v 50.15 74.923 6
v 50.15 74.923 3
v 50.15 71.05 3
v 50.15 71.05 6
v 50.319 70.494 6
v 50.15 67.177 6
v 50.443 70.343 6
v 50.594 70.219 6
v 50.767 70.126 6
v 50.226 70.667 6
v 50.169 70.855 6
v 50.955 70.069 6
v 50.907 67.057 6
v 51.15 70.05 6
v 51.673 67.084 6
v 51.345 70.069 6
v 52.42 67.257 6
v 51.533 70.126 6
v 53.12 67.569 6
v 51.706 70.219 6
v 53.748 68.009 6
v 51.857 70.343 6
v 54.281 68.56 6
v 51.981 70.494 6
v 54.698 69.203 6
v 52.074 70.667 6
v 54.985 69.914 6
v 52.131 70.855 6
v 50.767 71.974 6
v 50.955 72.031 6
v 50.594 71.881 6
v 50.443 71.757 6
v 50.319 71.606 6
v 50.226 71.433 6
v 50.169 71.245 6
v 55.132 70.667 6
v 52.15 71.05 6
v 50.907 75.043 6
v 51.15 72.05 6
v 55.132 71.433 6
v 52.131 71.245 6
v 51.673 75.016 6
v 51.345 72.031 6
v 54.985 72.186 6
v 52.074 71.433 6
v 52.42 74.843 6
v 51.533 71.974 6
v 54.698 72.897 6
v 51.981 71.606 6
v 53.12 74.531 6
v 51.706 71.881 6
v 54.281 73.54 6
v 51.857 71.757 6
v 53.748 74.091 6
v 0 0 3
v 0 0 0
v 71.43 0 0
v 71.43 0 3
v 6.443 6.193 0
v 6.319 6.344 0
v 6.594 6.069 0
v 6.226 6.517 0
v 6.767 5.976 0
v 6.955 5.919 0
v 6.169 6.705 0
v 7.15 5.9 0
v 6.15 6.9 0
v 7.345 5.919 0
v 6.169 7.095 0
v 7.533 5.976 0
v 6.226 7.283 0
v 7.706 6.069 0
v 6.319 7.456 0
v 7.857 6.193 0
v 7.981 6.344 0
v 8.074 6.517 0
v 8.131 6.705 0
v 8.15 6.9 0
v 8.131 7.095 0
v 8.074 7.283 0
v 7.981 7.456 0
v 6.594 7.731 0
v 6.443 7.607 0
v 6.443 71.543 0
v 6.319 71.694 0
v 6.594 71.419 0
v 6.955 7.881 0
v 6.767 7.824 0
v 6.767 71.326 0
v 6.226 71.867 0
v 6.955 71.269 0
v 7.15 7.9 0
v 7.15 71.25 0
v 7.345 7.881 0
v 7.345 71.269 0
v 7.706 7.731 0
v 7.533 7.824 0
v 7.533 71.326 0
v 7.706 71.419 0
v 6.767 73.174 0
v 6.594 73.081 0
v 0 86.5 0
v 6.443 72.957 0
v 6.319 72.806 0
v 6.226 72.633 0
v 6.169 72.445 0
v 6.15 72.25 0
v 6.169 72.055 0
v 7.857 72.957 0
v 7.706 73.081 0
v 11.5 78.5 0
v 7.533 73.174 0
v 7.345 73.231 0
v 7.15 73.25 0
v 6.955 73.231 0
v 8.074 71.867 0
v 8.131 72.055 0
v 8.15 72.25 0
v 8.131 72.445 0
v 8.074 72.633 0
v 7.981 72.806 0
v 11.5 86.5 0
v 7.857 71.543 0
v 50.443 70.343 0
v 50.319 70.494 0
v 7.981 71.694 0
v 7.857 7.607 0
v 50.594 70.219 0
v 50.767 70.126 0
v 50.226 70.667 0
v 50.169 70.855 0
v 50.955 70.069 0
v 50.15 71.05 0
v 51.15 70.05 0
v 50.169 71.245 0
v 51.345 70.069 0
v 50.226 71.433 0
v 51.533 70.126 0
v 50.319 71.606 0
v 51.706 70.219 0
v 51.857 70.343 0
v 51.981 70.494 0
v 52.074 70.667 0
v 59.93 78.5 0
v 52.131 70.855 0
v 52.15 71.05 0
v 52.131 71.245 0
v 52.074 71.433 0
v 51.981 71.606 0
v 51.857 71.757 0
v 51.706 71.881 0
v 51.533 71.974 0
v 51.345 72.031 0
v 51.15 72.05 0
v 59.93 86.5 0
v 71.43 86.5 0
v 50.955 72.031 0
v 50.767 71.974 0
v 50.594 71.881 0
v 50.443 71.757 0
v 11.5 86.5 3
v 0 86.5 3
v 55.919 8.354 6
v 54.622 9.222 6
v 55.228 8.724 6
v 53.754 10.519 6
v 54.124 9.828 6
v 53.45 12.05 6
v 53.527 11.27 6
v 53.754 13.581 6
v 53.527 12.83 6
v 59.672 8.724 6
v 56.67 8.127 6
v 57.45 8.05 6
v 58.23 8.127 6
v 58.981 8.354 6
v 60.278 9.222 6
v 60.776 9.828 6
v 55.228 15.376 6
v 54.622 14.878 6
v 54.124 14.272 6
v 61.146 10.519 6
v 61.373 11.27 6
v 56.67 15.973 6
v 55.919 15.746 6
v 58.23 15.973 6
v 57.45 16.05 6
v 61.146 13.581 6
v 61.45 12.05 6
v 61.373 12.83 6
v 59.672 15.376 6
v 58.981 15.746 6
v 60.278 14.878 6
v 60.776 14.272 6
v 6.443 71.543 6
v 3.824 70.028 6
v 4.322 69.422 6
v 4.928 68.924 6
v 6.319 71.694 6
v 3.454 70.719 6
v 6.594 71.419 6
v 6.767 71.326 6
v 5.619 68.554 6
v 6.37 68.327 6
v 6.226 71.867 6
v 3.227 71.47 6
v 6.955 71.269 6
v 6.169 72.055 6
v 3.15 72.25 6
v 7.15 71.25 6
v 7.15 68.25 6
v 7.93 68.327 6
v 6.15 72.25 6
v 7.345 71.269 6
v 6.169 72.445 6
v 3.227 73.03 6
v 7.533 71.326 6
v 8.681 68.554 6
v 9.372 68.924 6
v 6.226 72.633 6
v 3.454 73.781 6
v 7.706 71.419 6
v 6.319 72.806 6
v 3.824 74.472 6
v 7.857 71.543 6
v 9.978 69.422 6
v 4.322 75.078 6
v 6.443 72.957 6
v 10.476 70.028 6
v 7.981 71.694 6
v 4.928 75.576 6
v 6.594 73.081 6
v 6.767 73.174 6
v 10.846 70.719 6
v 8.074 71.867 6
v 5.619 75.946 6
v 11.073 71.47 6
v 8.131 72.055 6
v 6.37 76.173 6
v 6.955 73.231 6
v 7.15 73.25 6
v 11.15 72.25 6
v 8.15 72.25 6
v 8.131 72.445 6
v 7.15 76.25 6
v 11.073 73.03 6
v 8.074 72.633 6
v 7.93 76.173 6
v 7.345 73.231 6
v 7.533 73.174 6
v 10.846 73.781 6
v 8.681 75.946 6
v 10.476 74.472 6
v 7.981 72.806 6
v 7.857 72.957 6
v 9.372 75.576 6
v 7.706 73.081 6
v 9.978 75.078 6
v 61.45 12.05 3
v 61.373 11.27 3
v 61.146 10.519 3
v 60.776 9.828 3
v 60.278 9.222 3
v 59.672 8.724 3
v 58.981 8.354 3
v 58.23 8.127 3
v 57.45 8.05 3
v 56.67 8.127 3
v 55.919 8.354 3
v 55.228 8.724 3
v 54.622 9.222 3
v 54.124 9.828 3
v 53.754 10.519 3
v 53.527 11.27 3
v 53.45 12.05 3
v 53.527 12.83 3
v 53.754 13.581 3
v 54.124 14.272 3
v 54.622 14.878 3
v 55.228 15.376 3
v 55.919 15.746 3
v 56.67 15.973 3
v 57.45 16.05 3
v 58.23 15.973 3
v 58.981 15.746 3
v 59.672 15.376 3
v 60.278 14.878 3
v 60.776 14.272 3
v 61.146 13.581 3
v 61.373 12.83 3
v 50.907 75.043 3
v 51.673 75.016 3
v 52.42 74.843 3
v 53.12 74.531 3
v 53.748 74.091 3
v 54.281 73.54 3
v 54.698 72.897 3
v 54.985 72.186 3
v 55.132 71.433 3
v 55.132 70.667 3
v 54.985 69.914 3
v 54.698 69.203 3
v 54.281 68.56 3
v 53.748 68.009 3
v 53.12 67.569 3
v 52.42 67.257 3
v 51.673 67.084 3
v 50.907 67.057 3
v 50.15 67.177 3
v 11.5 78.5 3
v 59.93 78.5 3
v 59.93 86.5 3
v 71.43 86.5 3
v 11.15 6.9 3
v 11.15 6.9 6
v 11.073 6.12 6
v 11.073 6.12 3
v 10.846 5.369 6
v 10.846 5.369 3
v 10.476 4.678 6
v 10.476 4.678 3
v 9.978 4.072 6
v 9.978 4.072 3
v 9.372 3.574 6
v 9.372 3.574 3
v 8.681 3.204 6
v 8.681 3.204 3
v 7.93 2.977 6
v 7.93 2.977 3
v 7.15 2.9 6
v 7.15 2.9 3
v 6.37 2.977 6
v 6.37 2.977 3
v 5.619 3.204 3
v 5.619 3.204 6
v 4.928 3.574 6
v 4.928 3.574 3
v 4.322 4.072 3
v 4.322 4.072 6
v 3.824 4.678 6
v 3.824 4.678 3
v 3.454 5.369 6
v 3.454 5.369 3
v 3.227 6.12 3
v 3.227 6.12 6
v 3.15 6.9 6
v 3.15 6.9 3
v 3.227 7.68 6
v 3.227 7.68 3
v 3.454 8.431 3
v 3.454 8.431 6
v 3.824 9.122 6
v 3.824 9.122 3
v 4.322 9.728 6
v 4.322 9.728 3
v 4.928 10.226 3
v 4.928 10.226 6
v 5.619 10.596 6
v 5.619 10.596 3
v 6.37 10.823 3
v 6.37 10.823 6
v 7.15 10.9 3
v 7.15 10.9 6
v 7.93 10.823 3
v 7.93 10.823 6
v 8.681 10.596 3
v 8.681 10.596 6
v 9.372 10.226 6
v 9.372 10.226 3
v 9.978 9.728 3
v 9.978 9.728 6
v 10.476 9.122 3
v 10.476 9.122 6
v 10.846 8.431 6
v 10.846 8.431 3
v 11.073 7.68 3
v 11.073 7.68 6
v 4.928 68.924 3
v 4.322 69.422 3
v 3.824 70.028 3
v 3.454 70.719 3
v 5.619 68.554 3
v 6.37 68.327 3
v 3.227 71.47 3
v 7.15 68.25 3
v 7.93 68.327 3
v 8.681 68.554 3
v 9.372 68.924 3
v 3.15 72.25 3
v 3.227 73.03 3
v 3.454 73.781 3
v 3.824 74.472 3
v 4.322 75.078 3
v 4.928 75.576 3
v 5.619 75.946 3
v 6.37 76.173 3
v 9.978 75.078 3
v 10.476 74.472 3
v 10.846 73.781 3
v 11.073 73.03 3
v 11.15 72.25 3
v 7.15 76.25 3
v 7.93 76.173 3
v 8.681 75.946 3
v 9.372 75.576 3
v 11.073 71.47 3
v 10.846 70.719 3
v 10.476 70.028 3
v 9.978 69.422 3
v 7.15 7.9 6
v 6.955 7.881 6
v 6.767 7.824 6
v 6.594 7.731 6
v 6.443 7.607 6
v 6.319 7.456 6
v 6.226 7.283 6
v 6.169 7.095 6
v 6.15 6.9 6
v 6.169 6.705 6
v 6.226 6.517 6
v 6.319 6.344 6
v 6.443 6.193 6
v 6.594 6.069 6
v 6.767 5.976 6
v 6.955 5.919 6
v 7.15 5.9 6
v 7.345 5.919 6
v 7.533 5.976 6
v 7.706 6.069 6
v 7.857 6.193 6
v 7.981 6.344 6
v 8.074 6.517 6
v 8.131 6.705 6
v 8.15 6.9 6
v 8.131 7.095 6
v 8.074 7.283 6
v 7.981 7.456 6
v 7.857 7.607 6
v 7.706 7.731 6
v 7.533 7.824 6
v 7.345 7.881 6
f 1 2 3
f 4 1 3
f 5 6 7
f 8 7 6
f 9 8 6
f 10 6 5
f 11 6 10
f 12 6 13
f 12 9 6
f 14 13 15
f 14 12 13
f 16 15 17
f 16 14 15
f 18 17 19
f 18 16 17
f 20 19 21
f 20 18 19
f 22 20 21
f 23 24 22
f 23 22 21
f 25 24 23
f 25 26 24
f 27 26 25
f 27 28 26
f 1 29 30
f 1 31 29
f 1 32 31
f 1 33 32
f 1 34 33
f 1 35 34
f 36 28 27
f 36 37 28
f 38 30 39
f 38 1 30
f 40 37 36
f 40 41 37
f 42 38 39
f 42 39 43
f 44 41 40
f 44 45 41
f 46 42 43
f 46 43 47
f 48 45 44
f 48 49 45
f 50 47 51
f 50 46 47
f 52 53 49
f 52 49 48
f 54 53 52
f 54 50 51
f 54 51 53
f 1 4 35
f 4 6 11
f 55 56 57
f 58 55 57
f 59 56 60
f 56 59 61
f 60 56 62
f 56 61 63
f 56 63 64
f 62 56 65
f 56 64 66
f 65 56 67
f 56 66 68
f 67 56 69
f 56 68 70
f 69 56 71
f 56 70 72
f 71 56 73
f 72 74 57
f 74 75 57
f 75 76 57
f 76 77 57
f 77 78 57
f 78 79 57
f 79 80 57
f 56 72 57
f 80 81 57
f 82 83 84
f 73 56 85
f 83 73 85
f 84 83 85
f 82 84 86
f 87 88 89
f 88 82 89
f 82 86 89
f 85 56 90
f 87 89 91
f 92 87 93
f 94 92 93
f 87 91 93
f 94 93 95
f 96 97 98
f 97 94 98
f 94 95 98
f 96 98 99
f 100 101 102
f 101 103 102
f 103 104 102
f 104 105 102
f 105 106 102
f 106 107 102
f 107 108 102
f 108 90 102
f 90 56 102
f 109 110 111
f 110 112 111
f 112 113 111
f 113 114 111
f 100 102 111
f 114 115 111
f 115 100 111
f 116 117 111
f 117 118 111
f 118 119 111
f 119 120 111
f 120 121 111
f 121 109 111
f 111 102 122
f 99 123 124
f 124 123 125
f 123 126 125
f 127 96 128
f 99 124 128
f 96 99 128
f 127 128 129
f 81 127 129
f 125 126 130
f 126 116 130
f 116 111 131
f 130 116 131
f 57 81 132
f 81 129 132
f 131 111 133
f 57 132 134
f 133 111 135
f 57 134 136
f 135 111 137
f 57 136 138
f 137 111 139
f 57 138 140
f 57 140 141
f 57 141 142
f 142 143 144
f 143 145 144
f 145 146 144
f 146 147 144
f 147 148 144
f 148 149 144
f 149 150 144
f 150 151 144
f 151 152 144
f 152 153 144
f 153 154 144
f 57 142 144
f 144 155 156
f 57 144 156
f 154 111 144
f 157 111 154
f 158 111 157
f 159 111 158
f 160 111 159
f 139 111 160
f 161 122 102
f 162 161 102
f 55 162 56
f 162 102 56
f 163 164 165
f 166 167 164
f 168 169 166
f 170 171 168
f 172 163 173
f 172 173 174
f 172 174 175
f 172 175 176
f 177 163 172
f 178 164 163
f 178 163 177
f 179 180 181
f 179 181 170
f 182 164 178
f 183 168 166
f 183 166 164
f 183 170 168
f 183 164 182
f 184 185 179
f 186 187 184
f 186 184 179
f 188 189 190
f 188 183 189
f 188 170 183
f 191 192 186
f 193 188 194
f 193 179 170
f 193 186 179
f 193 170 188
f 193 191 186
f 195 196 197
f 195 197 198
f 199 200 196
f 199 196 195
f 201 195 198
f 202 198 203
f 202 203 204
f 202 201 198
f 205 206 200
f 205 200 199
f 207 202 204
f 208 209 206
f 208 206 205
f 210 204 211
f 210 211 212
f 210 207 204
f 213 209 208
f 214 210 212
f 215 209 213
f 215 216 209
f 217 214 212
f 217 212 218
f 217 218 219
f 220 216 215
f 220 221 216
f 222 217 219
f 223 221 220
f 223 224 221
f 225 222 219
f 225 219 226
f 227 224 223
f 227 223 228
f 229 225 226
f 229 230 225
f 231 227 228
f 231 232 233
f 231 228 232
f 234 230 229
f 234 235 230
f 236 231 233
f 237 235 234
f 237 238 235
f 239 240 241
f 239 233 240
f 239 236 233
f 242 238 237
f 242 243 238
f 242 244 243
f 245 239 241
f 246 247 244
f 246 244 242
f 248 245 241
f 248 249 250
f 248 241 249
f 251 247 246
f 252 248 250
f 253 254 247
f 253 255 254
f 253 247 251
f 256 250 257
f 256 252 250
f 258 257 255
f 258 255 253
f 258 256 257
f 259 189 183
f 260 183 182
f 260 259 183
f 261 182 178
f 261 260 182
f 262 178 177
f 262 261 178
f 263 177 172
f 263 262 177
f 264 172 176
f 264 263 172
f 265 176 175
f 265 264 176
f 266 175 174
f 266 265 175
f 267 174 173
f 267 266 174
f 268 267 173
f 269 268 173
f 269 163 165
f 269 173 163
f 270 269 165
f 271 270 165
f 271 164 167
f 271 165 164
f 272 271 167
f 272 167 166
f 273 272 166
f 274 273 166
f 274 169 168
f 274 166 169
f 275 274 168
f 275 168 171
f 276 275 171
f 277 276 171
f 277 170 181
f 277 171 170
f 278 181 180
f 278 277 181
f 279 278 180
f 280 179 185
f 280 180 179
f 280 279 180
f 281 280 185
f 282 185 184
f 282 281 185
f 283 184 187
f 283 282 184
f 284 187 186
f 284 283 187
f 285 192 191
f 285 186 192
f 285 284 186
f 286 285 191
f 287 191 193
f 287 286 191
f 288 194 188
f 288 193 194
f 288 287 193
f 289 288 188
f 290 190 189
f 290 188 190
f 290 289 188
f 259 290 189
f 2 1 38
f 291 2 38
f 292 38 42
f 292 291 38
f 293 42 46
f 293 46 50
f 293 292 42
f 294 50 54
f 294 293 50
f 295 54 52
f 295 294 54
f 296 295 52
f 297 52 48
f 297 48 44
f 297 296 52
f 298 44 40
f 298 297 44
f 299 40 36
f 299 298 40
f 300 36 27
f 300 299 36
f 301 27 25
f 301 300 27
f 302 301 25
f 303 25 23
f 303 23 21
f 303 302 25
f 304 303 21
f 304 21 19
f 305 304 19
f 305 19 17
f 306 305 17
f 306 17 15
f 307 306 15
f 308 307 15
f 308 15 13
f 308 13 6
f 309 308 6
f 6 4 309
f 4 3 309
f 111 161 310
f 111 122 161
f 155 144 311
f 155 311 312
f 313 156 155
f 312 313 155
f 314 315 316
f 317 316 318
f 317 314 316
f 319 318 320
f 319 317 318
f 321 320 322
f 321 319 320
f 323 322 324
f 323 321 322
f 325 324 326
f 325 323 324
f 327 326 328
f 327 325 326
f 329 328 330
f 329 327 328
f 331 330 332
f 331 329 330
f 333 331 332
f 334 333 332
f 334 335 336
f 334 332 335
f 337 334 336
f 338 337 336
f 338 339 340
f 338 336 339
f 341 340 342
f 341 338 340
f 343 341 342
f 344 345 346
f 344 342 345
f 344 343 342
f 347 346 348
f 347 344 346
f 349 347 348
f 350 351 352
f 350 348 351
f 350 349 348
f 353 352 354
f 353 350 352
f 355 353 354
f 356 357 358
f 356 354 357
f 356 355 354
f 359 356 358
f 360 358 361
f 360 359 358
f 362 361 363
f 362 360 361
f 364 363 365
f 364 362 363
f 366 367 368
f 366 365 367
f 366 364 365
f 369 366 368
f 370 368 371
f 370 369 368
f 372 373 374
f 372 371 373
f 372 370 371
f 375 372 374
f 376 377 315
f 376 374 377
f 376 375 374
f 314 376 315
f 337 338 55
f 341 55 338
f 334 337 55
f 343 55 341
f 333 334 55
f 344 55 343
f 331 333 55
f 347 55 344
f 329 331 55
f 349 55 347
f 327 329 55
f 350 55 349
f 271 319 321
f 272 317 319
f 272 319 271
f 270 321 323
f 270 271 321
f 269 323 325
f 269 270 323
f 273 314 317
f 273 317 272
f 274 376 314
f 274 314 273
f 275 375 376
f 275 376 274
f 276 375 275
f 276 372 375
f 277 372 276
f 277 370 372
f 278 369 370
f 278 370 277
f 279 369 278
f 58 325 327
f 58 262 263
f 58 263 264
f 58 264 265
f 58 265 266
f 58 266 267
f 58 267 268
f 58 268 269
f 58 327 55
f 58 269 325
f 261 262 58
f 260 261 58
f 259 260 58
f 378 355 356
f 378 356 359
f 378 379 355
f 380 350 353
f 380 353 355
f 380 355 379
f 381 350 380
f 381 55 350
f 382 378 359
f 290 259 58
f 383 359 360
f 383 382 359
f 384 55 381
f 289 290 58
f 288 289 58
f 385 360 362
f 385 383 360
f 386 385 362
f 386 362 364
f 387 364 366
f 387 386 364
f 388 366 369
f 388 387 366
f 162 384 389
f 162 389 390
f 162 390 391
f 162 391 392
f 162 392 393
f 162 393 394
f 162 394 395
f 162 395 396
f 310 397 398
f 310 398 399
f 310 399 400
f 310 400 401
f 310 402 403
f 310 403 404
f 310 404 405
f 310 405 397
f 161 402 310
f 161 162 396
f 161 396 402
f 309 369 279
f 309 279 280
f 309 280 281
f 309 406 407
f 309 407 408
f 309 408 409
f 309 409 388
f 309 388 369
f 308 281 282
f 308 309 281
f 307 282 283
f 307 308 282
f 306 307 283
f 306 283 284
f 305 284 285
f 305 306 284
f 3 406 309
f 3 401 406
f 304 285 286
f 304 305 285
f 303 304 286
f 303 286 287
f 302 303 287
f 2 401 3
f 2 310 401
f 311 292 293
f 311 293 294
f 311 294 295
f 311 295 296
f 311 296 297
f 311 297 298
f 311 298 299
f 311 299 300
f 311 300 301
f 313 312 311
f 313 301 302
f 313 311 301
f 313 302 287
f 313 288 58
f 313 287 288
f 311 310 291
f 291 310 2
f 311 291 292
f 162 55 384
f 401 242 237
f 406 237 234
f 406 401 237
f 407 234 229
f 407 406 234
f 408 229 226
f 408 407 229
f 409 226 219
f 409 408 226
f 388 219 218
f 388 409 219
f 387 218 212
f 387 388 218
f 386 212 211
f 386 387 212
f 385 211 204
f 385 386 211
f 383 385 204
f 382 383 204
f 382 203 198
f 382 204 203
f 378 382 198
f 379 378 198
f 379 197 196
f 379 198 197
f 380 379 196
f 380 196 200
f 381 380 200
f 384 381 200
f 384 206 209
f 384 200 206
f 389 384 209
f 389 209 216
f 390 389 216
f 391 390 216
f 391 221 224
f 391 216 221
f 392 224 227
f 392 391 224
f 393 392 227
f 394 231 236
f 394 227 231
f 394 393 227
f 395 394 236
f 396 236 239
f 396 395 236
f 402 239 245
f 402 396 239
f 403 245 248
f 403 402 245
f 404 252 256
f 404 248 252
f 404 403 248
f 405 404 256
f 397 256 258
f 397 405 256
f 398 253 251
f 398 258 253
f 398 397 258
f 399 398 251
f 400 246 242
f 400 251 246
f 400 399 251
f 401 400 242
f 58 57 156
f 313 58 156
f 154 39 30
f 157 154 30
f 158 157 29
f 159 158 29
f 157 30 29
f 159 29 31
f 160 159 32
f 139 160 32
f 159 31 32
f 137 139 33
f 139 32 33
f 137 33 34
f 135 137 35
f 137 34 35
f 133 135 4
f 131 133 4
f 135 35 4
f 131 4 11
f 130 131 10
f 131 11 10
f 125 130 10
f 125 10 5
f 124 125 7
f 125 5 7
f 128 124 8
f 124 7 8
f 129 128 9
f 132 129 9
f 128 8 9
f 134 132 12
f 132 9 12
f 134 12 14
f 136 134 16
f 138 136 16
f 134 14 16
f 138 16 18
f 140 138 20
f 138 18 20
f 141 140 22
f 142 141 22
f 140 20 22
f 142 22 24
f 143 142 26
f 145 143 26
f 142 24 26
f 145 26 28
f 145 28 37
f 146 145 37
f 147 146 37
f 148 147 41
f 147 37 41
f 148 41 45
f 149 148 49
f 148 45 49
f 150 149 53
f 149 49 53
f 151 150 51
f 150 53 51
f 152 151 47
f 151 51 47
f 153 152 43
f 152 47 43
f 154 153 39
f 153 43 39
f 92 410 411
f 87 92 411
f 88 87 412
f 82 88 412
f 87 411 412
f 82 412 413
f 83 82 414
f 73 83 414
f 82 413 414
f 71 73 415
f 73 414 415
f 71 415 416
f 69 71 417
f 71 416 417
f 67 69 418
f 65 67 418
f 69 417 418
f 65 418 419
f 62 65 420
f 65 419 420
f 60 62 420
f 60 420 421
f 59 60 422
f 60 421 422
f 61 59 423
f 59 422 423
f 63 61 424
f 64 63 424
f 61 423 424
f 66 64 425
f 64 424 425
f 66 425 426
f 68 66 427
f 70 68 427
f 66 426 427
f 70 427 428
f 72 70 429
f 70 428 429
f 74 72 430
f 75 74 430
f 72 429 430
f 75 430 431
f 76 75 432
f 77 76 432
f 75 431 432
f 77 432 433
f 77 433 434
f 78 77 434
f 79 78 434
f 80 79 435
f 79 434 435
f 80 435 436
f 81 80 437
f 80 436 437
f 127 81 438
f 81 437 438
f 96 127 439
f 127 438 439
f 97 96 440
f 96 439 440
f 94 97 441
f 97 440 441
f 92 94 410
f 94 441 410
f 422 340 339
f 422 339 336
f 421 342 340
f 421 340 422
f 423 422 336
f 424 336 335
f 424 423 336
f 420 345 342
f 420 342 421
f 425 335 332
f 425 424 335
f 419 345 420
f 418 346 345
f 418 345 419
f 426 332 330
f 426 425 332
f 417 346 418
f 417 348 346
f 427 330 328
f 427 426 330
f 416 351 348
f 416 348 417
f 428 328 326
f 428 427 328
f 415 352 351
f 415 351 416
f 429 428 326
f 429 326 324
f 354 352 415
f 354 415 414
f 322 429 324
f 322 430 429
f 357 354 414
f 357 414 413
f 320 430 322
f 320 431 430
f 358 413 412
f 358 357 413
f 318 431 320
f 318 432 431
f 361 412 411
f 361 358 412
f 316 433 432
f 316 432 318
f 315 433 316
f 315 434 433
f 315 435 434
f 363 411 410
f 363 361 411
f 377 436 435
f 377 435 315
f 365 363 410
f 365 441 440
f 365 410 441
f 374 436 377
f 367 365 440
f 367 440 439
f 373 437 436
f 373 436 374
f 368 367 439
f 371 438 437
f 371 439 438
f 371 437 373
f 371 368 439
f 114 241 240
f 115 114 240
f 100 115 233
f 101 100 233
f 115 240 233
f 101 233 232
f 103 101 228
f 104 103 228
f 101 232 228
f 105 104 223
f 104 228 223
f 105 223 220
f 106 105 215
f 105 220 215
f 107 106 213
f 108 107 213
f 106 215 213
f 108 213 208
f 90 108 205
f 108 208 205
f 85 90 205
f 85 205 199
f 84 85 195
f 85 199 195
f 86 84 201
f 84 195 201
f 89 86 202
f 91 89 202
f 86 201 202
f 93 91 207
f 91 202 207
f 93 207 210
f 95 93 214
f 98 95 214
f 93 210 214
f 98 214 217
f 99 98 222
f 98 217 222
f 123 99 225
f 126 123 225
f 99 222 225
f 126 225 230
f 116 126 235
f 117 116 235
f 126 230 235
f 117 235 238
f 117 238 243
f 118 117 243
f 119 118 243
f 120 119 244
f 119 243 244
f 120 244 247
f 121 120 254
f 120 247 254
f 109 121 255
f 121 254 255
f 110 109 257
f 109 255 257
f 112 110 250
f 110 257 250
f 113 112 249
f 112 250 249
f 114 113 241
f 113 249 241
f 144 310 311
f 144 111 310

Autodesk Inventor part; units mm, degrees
ref_plane "YZ Plane" through (0, 0, 0) normal (1, 0, 0) x (0, 1, 0)
ref_plane "XZ Plane" through (0, 0, 0) normal (0, 1, 0) x (-1, 0, 0)
ref_plane "XY Plane" through (0, 0, 0) normal (0, 0, 1) x (1, 0, 0)
sketch "Sketch1" plane through (0, 0, 0) normal (0, 0, 1) x (1, 0, 0)
  line L0 (0, 0) -> (71.43, 0)
  line L1 (71.43, 0) -> (71.43, 86.5)
  line L2 (71.43, 86.5) -> (0, 86.5)
  line L3 (0, 86.5) -> (0, 0)
  line L4 (14, 86.5) -> (57.43, 86.5)
  circle A0 centre (6.25, 81.5) radius 1.5
  circle A1 centre (65.18, 81.5) radius 1.5
  line L5 (11.5, 78.5) -> (59.93, 78.5)
  line L6 (59.93, 78.5) -> (59.93, 86.5)
  line L7 (59.93, 86.5) -> (11.5, 86.5)
  line L8 (11.5, 86.5) -> (11.5, 78.5)
  line L9 (11.5, 78.5) -> (59.93, 86.5) construction
  line L10 (59.93, 78.5) -> (11.5, 86.5) construction
  line L11 (35.715, 86.5) -> (35.715, 82.5) construction
  line L12 (2.95, 2.05) -> (68.45, 2.05)
  line L13 (68.45, 2.05) -> (68.45, 76.45)
  line L14 (68.45, 76.45) -> (2.95, 76.45)
  line L15 (2.95, 76.45) -> (2.95, 2.05)
  line L16 (2.95, 2.05) -> (68.45, 76.45) construction
  line L17 (68.45, 2.05) -> (2.95, 76.45) construction
  circle A2 centre (7.15, 72.25) radius 4
  circle A3 centre (51.15, 71.05) radius 4
  circle A4 centre (7.15, 6.9) radius 4
  circle A5 centre (57.45, 12.05) radius 4
  circle A6 centre (7.15, 72.25) radius 1
  circle A7 centre (51.15, 71.05) radius 1
  circle A8 centre (7.15, 6.9) radius 1
  circle A9 centre (57.45, 12.05) radius 1
  line L18 (50.15, 74.923) -> (50.15, 67.177)
  point P0 (11.5, 86.5)
  point P1 (35.7, 39.25)
  point P2 (35.715, 0)
  point P3 (35.7, 2.05)
  point P4 (9.1397, 10.37)
  point P5 (9.1397, 3.43)
  point P6 (8.15, 10.773)
  point P7 (8.15, 3.027)
  dimension "d0" = 71.43
  dimension "d1" = 86.5
  dimension "d8" = 3
  dimension "d9" = 6.25
  dimension "d10" = 5
  dimension "d11" = 3
  dimension "d12" = 5
  dimension "d13" = 6.25
  dimension "d15" = 48.43
  dimension "d16" = 8
  dimension "d17" = 4
  dimension "d19" = 65.5
  dimension "d20" = 74.4
  dimension "d21" = 2.05
  dimension "d22" = 2.95
  dimension "d23" = 4.2
  dimension "d24" = 4.2
  dimension "d25" = 8
  dimension "d26" = 8
  dimension "d27" = 5.4
  dimension "d29" = 4.85
  dimension "d30" = 4.2
  dimension "d31" = 8
  dimension "d34" = 8
  dimension "d35" = 11
  dimension "d36" = 10
  dimension "d37" = 2
  dimension "d38" = 2
  dimension "d39" = 2
  dimension "d40" = 2
  dimension "d55" = 44
extrude "Extrusion1" add sketch "Sketch1" along normal blind 3 contours L3 L2 L8 L5 L6 L1 L0 | A0 | A1 | L15 L14 L13 L12 | A2 | A7 | A3 L18 | L18 A3 | A4 | A5 | A6 | A8 | A9
extrude "Extrusion2" add sketch "Sketch1" along normal blind 6 contours A2 | A7 | A3 L18 | A4 | A5 | A6 | A8 | A9 picked at (54.1155, 70.7487)
hole "Hole2" at (51.15, 71.05, 0) at (7.15, 72.25, 0) at (7.15, 6.9, 0) direction (0, 0, 1) diameter 2 end through all
equation "\"d13\" = d9"
properties part number "Component_shield_layered_PCB_platform"
